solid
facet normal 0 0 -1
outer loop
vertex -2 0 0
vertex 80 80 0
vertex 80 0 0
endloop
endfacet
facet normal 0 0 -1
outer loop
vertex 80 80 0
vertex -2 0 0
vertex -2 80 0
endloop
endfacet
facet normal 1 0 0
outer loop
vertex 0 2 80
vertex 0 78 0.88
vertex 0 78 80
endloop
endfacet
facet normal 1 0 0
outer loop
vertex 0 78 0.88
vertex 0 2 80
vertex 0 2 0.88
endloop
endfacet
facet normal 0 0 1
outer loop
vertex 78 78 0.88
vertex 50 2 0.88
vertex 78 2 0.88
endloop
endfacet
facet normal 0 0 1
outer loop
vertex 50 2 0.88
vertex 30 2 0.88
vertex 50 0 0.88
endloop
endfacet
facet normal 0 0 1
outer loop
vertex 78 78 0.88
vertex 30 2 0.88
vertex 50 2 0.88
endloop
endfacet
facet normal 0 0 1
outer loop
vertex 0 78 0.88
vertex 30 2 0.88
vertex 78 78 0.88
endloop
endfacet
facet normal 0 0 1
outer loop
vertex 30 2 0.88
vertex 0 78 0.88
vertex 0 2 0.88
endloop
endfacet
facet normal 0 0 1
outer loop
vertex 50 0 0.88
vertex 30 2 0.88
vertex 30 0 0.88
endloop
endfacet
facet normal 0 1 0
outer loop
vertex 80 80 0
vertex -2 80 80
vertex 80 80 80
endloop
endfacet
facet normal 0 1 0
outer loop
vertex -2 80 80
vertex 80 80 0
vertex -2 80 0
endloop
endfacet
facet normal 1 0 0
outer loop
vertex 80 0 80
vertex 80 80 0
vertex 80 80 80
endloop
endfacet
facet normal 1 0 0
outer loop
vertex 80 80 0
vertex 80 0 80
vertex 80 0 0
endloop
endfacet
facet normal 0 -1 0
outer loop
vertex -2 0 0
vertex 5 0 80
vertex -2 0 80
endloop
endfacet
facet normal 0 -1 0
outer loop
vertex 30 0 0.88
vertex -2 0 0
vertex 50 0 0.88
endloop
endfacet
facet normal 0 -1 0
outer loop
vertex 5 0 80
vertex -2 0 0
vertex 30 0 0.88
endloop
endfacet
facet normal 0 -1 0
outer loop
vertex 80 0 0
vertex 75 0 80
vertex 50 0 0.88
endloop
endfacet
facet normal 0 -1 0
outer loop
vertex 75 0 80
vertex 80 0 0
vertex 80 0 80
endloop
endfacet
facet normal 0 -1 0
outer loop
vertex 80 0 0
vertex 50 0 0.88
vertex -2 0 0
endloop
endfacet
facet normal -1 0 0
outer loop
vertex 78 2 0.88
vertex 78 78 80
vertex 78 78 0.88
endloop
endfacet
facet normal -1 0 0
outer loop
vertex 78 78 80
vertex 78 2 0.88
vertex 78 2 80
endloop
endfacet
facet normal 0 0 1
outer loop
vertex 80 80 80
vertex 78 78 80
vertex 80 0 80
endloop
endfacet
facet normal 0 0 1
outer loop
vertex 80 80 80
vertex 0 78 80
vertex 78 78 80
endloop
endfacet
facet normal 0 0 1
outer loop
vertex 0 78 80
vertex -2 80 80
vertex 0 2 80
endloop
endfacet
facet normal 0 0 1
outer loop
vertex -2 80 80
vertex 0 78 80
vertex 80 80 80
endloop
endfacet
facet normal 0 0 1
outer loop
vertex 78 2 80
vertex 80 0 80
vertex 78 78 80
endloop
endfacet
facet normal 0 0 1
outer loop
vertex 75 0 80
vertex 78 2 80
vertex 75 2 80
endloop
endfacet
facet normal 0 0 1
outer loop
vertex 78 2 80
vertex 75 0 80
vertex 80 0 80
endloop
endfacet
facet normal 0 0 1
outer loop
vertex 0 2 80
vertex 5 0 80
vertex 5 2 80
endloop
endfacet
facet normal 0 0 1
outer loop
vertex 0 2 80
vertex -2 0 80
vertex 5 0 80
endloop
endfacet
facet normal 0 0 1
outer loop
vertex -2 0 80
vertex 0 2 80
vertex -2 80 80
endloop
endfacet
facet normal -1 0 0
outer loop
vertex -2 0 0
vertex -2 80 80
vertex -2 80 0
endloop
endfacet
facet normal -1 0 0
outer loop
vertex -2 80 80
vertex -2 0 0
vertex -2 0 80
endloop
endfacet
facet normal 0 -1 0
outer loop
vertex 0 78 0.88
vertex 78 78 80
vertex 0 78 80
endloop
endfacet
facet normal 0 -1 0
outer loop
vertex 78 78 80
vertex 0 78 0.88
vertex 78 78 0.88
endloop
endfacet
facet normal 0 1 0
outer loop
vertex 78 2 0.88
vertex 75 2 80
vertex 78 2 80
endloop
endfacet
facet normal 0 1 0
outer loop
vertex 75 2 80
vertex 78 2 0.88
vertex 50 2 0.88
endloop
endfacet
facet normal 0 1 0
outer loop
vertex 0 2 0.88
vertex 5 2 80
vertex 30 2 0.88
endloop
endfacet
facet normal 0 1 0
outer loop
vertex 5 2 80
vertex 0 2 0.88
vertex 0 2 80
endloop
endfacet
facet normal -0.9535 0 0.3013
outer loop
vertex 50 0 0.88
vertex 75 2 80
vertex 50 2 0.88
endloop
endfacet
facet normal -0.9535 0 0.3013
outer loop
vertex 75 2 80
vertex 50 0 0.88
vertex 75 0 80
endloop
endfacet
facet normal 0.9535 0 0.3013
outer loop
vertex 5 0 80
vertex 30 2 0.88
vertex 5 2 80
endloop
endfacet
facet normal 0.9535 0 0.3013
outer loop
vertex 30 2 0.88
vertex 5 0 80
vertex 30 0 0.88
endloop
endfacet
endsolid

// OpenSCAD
Wall = 2;
PostItInWidth = 78;
PostItOutWidth = PostItInWidth + Wall;
FaceX = PostItOutWidth/16;
FloorHeight = 0.4 + 3 * 0.16;

/*
2020.03.13 Changes made were for the slicer.
    FloorHeight was added to be the desired floorHeight
    of initial layer + X * layer height.
    adjustment to the poloygon was so the opening came
    all the way to the bottom.
*/

Build();

module Build() {
    PostIt_NoteBox();
}

module PostIt_NoteBox()
{
    union()
    {
        FrontOfBox();
        translate([PostItOutWidth/2,PostItOutWidth/2,PostItOutWidth/2])
        OpenFaceBox(PostItOutWidth,PostItOutWidth,PostItOutWidth,Wall);
    }
}

module FrontOfBox()
{
    facePoly = 
    [
        [0,0],
        [PostItOutWidth, 0],
        [PostItOutWidth, PostItOutWidth],
        [15 * FaceX, PostItOutWidth],
        [10 * FaceX, FloorHeight],
        [6 * FaceX, FloorHeight],
        [FaceX, PostItOutWidth],
        [0, PostItOutWidth]
    ];
    echo(facePoly=facePoly);

    translate([0,Wall/2,0])
    rotate([90,0,0]) 
    linear_extrude(height=Wall, center=true)
    polygon(facePoly);
}
/*
Was having issue with the slicer not slicing the walls
properly. Refactored to build the box one wall at a time.
*/
module OpenFaceBox(width, depth, height, wall)
{
    //Front - none
    //Top - none
    //Bottom
    #translate([0,0,-height/2])
    linear_extrude(height=FloorHeight)
    square(size=[width, depth], center=true);
    //Right
    translate([height/2-wall,0,0])
    rotate([0,90,0])
    linear_extrude(height=wall)
    square(size=[width, height], center=true);
    //left
    translate([-height/2-wall,0,0])
    rotate([0,90,0])
    linear_extrude(height=wall)
    square(size=[width, height], center=true);
    //Back
    translate([0,height/2,0])
    rotate([90,0,0])
    linear_extrude(height=wall)
    square(size=[width, height], center=true);

}
